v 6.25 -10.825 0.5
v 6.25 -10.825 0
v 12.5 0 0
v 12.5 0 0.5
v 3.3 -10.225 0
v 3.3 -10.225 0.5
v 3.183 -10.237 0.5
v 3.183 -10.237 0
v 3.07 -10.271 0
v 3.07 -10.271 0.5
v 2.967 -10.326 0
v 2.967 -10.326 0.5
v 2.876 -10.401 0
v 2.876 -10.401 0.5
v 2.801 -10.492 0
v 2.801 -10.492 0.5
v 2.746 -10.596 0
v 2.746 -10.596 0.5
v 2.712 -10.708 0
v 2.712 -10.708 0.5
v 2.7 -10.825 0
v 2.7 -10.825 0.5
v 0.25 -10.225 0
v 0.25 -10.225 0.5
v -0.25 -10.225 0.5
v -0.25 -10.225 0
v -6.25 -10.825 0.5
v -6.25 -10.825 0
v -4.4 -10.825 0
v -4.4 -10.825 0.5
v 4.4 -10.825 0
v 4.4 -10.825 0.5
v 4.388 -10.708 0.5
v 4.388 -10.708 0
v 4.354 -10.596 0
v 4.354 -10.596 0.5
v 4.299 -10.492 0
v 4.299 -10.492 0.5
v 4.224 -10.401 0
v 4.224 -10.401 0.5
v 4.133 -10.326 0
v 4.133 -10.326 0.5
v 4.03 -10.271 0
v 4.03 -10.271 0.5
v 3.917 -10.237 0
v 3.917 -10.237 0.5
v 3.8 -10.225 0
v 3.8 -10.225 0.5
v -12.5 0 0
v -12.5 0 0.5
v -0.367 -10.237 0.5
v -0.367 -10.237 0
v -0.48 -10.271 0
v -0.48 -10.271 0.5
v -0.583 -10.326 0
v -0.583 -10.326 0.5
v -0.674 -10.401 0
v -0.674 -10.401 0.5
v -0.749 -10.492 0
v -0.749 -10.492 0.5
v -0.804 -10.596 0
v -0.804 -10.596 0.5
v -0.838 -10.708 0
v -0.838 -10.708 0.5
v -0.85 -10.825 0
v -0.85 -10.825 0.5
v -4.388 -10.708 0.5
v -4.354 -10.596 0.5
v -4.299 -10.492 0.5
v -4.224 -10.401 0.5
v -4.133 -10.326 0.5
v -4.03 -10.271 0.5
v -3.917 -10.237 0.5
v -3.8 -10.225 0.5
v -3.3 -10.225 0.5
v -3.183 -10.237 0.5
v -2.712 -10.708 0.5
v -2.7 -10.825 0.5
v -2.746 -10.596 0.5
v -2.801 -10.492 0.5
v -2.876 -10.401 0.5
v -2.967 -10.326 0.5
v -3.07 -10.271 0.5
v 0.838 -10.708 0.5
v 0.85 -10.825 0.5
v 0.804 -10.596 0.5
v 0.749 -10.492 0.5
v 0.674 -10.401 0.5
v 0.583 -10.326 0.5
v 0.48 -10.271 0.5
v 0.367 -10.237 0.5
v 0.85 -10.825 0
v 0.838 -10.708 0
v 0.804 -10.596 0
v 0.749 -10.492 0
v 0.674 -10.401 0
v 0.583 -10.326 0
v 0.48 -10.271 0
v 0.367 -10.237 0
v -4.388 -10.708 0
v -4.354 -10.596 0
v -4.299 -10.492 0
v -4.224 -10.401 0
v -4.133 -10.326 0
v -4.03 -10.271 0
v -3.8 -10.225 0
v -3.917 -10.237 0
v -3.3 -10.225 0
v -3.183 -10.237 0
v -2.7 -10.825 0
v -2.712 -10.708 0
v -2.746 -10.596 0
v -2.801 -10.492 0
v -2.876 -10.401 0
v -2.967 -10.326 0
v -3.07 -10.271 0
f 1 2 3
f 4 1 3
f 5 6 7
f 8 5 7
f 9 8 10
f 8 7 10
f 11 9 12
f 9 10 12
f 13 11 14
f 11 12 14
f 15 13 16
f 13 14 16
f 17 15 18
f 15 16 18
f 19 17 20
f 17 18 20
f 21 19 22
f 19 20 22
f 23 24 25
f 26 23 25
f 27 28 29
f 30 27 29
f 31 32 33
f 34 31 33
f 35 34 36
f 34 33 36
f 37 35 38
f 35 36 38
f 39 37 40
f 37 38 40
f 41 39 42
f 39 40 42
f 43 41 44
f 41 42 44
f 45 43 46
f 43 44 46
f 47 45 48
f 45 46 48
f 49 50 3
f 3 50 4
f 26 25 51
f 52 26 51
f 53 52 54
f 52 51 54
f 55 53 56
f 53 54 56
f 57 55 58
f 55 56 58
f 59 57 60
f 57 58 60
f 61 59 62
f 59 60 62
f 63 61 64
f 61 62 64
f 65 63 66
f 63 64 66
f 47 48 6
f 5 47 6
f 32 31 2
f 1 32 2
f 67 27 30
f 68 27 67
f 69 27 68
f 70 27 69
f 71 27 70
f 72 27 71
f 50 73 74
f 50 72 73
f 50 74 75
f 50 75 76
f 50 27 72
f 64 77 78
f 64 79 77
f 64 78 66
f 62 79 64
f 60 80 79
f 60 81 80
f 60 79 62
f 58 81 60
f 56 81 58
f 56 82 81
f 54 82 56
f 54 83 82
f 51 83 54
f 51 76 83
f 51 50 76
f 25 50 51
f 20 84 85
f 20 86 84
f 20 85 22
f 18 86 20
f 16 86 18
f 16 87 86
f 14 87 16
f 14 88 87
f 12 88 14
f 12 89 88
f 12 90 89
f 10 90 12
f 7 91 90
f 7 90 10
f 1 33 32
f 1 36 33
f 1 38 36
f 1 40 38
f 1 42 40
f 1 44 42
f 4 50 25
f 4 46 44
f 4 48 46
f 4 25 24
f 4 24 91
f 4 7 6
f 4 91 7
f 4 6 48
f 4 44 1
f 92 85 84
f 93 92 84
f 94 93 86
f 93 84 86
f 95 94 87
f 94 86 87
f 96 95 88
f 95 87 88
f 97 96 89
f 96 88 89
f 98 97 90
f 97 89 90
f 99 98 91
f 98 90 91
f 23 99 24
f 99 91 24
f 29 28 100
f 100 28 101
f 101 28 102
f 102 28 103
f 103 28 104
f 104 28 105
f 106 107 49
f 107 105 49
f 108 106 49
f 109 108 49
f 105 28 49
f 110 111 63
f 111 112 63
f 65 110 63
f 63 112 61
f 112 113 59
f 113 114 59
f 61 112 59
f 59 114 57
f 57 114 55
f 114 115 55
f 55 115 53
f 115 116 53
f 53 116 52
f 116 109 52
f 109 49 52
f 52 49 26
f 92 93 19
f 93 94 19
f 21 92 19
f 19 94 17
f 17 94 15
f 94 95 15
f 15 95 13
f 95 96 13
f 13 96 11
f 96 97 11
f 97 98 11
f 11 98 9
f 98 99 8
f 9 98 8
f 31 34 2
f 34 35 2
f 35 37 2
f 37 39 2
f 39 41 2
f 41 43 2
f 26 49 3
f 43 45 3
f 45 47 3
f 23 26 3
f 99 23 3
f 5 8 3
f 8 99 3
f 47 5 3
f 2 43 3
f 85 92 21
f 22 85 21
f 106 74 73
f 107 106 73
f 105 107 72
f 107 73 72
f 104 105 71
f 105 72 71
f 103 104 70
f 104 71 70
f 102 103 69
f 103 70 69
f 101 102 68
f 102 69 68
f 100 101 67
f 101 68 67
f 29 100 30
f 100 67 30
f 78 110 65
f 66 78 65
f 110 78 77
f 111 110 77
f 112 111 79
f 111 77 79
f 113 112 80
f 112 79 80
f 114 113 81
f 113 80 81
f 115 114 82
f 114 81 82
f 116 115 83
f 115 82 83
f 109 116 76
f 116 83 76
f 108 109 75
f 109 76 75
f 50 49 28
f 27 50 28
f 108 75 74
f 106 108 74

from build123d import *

# Parameters (mm, degrees)
F1_DEPTH = 0.5
F3_DEPTH = 0.501
F5_DEPTH = 0.501


with BuildPart() as f1:
    # F0 (on Top) → F1 (new body)
    with BuildSketch(Plane.XY):
        Polygon((6.25, -10.825318), (12.5, 0), (6.25, 10.825318), (-6.25, 10.825318), (-12.5, 0), (-6.25, -10.825318), align=None)
    extrude(amount=F1_DEPTH)

    # F2 (on face) → F3 (cut, through all)
    with BuildSketch(Plane.XY.offset(0.5)):
        with BuildLine():
            ThreePointArc((4.4, -10.825318), (4.224264, -10.401053), (3.8, -10.225318))
            Line((3.8, -10.225318), (3.3, -10.225318))
            ThreePointArc((3.3, -10.225318), (2.875736, -10.401053), (2.7, -10.825318))
            Line((2.7, -10.825318), (4.4, -10.825318))
        make_face()
        with BuildLine():
            ThreePointArc((0.85, -10.825318), (0.674264, -10.401053), (0.25, -10.225318))
            Line((0.25, -10.225318), (-0.25, -10.225318))
            ThreePointArc((-0.25, -10.225318), (-0.674264, -10.401053), (-0.85, -10.825318))
            Line((-0.85, -10.825318), (0.85, -10.825318))
        make_face()
        with BuildLine():
            ThreePointArc((-2.7, -10.825318), (-2.875736, -10.401053), (-3.3, -10.225318))
            Line((-3.3, -10.225318), (-3.8, -10.225318))
            ThreePointArc((-3.8, -10.225318), (-4.224264, -10.401053), (-4.4, -10.825318))
            Line((-4.4, -10.825318), (-2.7, -10.825318))
        make_face()
    extrude(amount=-F3_DEPTH, mode=Mode.SUBTRACT)

    # F4 (on face) → F5 (cut, through all)
    with BuildSketch(Plane.XY.offset(0.5)):
        Polygon((-6.25, 10.825318), (-12.5, 0), (12.5, 0), (6.25, 10.825318), align=None)
    extrude(amount=-F5_DEPTH, mode=Mode.SUBTRACT)


solid = f1.part
